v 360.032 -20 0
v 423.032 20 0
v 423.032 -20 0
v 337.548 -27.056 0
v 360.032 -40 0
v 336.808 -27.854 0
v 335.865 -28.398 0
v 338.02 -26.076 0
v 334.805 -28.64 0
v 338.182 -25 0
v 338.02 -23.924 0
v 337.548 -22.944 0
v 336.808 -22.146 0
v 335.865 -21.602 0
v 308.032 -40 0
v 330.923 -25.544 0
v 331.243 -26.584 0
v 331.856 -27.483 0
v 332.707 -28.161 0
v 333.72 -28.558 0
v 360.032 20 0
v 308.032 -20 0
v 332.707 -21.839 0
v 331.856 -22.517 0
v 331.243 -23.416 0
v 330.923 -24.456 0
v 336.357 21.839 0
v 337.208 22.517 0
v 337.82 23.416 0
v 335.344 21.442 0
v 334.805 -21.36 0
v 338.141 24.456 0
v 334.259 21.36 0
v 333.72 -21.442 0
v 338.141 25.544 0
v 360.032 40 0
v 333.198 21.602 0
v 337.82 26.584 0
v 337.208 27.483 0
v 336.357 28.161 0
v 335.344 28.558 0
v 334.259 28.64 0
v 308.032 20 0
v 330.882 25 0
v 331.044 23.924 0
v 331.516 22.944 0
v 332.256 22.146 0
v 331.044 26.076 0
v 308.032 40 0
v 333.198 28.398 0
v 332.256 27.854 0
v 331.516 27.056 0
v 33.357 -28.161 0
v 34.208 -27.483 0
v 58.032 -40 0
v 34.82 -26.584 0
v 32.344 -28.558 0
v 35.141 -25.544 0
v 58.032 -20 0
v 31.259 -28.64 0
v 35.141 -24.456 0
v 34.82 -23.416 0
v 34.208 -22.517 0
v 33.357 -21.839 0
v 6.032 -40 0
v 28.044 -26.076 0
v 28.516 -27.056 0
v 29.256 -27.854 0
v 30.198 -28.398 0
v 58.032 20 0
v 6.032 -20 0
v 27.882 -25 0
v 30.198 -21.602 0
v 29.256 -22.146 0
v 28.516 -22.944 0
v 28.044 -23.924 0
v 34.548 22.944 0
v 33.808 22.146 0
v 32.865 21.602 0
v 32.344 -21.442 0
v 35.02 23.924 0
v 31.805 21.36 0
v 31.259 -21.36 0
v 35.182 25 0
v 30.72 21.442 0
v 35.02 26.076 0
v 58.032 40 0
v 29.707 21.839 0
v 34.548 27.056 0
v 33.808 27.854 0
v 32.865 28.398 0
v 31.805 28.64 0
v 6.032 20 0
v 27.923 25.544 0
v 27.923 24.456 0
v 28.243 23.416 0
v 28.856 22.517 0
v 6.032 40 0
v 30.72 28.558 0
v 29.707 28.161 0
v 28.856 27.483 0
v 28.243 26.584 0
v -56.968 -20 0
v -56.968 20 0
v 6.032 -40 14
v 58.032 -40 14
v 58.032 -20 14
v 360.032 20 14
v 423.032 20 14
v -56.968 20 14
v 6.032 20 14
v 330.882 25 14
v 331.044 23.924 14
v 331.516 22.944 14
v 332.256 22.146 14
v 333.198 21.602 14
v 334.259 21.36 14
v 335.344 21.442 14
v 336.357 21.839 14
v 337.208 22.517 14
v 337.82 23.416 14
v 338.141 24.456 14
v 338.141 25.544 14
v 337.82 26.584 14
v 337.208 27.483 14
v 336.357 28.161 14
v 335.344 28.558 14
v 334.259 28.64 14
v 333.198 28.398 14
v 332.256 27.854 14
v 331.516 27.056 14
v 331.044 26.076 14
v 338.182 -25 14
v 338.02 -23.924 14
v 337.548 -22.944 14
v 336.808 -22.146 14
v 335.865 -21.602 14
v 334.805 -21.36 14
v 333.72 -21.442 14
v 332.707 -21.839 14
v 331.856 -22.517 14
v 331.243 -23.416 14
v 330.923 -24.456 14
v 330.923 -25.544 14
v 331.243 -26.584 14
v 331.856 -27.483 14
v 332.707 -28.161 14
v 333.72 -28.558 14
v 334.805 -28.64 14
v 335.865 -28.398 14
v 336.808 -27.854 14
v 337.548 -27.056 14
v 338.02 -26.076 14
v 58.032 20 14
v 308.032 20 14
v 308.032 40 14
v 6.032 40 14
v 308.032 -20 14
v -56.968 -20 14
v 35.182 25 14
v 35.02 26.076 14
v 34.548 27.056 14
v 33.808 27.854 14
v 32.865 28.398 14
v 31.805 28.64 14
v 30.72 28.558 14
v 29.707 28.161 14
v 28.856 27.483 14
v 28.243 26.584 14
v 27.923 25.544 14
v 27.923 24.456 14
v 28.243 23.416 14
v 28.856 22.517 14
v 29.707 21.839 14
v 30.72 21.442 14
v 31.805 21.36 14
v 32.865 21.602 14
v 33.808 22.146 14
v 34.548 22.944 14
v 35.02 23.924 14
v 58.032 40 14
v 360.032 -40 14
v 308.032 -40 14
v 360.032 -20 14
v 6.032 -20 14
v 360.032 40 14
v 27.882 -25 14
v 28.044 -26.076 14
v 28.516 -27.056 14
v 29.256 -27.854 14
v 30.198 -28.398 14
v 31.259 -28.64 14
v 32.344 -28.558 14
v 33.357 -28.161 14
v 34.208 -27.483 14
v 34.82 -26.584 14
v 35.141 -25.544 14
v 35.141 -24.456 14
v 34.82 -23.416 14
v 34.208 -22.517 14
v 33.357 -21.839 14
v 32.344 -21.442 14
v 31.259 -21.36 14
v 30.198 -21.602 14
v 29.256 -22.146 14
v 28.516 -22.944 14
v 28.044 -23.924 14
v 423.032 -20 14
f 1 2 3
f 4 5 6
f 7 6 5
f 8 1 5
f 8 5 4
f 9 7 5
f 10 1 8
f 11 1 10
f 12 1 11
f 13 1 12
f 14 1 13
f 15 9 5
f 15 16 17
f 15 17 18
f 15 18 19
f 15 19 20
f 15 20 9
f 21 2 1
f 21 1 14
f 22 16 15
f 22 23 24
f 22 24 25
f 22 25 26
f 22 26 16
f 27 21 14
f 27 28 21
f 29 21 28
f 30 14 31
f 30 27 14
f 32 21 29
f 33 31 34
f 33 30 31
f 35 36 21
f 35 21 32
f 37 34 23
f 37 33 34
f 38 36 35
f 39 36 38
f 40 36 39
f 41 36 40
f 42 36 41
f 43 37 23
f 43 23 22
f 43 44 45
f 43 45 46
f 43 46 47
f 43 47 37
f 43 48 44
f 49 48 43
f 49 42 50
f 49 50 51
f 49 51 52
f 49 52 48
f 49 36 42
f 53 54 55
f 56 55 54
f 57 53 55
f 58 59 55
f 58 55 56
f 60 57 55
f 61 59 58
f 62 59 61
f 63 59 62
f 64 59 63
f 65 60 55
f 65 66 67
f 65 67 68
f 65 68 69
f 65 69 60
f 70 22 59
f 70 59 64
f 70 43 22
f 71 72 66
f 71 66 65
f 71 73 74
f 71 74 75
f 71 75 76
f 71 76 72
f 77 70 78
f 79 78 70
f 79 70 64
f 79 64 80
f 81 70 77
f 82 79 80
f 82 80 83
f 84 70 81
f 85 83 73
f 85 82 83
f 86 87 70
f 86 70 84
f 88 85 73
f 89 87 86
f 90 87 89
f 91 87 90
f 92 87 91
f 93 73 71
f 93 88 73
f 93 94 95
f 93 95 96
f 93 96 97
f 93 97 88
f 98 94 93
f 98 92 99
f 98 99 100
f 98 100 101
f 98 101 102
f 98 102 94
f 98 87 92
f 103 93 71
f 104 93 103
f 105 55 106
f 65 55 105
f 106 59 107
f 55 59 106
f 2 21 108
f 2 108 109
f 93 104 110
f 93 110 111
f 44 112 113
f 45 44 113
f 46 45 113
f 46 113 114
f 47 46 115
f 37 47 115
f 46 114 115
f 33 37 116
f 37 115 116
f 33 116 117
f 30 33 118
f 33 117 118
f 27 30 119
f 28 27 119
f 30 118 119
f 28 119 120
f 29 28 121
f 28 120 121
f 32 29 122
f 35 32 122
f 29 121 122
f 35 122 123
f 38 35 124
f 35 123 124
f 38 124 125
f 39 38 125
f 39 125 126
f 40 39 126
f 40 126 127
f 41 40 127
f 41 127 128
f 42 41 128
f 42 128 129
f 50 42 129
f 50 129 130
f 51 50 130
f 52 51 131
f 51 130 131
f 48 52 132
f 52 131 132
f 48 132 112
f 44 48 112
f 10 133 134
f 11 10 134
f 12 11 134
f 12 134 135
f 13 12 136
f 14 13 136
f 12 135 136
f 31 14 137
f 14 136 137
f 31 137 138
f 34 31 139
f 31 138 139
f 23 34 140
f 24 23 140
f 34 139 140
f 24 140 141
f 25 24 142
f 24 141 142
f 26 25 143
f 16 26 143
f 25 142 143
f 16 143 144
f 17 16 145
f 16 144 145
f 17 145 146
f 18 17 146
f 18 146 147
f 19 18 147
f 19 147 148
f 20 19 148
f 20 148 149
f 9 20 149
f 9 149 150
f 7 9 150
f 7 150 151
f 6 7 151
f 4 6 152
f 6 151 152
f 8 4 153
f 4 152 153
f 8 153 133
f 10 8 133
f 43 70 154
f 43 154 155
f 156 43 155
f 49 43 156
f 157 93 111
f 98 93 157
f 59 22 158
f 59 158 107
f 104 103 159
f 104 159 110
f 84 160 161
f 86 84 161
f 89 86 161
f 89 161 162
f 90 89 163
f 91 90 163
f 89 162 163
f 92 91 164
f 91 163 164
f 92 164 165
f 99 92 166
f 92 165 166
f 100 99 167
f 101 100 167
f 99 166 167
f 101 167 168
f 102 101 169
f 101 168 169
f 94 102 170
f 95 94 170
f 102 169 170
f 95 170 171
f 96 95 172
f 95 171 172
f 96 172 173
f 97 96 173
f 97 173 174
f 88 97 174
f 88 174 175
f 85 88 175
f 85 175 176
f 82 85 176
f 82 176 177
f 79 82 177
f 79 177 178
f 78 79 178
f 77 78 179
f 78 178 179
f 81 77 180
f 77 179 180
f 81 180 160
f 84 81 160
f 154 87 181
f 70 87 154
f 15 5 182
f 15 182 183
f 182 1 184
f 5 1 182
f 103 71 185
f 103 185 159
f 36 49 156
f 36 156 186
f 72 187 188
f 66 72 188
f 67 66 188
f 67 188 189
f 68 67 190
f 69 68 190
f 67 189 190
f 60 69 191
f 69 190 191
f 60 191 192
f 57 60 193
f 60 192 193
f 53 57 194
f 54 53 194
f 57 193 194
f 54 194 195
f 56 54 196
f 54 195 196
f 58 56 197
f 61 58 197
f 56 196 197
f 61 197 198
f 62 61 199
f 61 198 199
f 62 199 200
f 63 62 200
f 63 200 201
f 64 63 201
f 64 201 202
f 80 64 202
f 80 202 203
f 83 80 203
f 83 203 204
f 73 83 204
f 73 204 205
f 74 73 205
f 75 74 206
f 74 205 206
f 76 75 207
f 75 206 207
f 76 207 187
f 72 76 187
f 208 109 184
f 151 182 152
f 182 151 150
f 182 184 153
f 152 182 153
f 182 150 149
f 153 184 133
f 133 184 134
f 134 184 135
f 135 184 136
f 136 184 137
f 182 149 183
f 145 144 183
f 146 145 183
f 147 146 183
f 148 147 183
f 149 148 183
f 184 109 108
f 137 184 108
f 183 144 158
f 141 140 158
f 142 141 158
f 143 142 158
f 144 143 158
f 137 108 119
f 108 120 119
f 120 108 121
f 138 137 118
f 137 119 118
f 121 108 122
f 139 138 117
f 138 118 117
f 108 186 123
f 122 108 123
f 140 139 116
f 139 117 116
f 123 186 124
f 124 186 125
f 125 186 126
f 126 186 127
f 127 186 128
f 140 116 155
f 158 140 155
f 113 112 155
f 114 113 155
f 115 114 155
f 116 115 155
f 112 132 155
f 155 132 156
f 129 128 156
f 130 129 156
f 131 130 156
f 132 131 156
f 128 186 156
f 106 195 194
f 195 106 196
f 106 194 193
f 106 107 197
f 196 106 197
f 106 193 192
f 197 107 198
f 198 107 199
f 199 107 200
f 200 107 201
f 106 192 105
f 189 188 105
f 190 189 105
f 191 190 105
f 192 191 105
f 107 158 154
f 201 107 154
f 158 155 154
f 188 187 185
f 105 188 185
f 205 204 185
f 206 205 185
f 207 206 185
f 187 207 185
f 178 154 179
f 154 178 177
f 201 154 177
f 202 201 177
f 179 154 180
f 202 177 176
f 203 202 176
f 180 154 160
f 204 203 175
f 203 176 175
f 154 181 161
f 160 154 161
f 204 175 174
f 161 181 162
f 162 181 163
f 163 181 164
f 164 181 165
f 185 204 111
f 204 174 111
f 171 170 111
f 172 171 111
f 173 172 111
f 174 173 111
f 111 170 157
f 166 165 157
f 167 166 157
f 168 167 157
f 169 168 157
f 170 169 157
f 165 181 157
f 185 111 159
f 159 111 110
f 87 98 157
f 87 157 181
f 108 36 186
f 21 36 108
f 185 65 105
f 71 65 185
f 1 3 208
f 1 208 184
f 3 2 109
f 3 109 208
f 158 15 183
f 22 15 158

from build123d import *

# Parameters (mm, degrees)
BOSS_EXTRUDE1_DEPTH = 14
SKETCH3_R           = 3.65
CUT_EXTRUDE1_DEPTH  = 14


with BuildPart() as part:
    # Sketch2 → Boss-Extrude1 (new body)
    with BuildSketch(Plane.XY):
        Polygon((-56.968136793, -20), (-56.968136793, 20), (6.031863207, 20), (6.031863207, 40), (58.031863207, 40), (58.031863207, 20), (308.031863207, 20), (308.031863207, 40), (360.031863207, 40), (360.031863207, 20), (423.031863207, 20), (423.031863207, -20), (360.031863207, -20), (360.031863207, -40), (308.031863207, -40), (308.031863207, -20), (58.031863207, -20), (58.031863207, -40), (6.031863207, -40), (6.031863207, -20), align=None)
    extrude(amount=BOSS_EXTRUDE1_DEPTH)

    # Sketch3 → Cut-Extrude1 (cut)
    with BuildSketch(Plane.XY.offset(14)):
        with Locations((31.531863207, 25)):
            Circle(SKETCH3_R)
        with Locations(Location((31.531863207, -25, 0), (0, 0, 180))):
            Circle(SKETCH3_R)
        with Locations((334.531863207, -25)):
            Circle(SKETCH3_R)
        with Locations(Location((334.531863207, 25, 0), (0, 0, 180))):
            Circle(SKETCH3_R)
    extrude(amount=-CUT_EXTRUDE1_DEPTH, mode=Mode.SUBTRACT)


solid = part.part
